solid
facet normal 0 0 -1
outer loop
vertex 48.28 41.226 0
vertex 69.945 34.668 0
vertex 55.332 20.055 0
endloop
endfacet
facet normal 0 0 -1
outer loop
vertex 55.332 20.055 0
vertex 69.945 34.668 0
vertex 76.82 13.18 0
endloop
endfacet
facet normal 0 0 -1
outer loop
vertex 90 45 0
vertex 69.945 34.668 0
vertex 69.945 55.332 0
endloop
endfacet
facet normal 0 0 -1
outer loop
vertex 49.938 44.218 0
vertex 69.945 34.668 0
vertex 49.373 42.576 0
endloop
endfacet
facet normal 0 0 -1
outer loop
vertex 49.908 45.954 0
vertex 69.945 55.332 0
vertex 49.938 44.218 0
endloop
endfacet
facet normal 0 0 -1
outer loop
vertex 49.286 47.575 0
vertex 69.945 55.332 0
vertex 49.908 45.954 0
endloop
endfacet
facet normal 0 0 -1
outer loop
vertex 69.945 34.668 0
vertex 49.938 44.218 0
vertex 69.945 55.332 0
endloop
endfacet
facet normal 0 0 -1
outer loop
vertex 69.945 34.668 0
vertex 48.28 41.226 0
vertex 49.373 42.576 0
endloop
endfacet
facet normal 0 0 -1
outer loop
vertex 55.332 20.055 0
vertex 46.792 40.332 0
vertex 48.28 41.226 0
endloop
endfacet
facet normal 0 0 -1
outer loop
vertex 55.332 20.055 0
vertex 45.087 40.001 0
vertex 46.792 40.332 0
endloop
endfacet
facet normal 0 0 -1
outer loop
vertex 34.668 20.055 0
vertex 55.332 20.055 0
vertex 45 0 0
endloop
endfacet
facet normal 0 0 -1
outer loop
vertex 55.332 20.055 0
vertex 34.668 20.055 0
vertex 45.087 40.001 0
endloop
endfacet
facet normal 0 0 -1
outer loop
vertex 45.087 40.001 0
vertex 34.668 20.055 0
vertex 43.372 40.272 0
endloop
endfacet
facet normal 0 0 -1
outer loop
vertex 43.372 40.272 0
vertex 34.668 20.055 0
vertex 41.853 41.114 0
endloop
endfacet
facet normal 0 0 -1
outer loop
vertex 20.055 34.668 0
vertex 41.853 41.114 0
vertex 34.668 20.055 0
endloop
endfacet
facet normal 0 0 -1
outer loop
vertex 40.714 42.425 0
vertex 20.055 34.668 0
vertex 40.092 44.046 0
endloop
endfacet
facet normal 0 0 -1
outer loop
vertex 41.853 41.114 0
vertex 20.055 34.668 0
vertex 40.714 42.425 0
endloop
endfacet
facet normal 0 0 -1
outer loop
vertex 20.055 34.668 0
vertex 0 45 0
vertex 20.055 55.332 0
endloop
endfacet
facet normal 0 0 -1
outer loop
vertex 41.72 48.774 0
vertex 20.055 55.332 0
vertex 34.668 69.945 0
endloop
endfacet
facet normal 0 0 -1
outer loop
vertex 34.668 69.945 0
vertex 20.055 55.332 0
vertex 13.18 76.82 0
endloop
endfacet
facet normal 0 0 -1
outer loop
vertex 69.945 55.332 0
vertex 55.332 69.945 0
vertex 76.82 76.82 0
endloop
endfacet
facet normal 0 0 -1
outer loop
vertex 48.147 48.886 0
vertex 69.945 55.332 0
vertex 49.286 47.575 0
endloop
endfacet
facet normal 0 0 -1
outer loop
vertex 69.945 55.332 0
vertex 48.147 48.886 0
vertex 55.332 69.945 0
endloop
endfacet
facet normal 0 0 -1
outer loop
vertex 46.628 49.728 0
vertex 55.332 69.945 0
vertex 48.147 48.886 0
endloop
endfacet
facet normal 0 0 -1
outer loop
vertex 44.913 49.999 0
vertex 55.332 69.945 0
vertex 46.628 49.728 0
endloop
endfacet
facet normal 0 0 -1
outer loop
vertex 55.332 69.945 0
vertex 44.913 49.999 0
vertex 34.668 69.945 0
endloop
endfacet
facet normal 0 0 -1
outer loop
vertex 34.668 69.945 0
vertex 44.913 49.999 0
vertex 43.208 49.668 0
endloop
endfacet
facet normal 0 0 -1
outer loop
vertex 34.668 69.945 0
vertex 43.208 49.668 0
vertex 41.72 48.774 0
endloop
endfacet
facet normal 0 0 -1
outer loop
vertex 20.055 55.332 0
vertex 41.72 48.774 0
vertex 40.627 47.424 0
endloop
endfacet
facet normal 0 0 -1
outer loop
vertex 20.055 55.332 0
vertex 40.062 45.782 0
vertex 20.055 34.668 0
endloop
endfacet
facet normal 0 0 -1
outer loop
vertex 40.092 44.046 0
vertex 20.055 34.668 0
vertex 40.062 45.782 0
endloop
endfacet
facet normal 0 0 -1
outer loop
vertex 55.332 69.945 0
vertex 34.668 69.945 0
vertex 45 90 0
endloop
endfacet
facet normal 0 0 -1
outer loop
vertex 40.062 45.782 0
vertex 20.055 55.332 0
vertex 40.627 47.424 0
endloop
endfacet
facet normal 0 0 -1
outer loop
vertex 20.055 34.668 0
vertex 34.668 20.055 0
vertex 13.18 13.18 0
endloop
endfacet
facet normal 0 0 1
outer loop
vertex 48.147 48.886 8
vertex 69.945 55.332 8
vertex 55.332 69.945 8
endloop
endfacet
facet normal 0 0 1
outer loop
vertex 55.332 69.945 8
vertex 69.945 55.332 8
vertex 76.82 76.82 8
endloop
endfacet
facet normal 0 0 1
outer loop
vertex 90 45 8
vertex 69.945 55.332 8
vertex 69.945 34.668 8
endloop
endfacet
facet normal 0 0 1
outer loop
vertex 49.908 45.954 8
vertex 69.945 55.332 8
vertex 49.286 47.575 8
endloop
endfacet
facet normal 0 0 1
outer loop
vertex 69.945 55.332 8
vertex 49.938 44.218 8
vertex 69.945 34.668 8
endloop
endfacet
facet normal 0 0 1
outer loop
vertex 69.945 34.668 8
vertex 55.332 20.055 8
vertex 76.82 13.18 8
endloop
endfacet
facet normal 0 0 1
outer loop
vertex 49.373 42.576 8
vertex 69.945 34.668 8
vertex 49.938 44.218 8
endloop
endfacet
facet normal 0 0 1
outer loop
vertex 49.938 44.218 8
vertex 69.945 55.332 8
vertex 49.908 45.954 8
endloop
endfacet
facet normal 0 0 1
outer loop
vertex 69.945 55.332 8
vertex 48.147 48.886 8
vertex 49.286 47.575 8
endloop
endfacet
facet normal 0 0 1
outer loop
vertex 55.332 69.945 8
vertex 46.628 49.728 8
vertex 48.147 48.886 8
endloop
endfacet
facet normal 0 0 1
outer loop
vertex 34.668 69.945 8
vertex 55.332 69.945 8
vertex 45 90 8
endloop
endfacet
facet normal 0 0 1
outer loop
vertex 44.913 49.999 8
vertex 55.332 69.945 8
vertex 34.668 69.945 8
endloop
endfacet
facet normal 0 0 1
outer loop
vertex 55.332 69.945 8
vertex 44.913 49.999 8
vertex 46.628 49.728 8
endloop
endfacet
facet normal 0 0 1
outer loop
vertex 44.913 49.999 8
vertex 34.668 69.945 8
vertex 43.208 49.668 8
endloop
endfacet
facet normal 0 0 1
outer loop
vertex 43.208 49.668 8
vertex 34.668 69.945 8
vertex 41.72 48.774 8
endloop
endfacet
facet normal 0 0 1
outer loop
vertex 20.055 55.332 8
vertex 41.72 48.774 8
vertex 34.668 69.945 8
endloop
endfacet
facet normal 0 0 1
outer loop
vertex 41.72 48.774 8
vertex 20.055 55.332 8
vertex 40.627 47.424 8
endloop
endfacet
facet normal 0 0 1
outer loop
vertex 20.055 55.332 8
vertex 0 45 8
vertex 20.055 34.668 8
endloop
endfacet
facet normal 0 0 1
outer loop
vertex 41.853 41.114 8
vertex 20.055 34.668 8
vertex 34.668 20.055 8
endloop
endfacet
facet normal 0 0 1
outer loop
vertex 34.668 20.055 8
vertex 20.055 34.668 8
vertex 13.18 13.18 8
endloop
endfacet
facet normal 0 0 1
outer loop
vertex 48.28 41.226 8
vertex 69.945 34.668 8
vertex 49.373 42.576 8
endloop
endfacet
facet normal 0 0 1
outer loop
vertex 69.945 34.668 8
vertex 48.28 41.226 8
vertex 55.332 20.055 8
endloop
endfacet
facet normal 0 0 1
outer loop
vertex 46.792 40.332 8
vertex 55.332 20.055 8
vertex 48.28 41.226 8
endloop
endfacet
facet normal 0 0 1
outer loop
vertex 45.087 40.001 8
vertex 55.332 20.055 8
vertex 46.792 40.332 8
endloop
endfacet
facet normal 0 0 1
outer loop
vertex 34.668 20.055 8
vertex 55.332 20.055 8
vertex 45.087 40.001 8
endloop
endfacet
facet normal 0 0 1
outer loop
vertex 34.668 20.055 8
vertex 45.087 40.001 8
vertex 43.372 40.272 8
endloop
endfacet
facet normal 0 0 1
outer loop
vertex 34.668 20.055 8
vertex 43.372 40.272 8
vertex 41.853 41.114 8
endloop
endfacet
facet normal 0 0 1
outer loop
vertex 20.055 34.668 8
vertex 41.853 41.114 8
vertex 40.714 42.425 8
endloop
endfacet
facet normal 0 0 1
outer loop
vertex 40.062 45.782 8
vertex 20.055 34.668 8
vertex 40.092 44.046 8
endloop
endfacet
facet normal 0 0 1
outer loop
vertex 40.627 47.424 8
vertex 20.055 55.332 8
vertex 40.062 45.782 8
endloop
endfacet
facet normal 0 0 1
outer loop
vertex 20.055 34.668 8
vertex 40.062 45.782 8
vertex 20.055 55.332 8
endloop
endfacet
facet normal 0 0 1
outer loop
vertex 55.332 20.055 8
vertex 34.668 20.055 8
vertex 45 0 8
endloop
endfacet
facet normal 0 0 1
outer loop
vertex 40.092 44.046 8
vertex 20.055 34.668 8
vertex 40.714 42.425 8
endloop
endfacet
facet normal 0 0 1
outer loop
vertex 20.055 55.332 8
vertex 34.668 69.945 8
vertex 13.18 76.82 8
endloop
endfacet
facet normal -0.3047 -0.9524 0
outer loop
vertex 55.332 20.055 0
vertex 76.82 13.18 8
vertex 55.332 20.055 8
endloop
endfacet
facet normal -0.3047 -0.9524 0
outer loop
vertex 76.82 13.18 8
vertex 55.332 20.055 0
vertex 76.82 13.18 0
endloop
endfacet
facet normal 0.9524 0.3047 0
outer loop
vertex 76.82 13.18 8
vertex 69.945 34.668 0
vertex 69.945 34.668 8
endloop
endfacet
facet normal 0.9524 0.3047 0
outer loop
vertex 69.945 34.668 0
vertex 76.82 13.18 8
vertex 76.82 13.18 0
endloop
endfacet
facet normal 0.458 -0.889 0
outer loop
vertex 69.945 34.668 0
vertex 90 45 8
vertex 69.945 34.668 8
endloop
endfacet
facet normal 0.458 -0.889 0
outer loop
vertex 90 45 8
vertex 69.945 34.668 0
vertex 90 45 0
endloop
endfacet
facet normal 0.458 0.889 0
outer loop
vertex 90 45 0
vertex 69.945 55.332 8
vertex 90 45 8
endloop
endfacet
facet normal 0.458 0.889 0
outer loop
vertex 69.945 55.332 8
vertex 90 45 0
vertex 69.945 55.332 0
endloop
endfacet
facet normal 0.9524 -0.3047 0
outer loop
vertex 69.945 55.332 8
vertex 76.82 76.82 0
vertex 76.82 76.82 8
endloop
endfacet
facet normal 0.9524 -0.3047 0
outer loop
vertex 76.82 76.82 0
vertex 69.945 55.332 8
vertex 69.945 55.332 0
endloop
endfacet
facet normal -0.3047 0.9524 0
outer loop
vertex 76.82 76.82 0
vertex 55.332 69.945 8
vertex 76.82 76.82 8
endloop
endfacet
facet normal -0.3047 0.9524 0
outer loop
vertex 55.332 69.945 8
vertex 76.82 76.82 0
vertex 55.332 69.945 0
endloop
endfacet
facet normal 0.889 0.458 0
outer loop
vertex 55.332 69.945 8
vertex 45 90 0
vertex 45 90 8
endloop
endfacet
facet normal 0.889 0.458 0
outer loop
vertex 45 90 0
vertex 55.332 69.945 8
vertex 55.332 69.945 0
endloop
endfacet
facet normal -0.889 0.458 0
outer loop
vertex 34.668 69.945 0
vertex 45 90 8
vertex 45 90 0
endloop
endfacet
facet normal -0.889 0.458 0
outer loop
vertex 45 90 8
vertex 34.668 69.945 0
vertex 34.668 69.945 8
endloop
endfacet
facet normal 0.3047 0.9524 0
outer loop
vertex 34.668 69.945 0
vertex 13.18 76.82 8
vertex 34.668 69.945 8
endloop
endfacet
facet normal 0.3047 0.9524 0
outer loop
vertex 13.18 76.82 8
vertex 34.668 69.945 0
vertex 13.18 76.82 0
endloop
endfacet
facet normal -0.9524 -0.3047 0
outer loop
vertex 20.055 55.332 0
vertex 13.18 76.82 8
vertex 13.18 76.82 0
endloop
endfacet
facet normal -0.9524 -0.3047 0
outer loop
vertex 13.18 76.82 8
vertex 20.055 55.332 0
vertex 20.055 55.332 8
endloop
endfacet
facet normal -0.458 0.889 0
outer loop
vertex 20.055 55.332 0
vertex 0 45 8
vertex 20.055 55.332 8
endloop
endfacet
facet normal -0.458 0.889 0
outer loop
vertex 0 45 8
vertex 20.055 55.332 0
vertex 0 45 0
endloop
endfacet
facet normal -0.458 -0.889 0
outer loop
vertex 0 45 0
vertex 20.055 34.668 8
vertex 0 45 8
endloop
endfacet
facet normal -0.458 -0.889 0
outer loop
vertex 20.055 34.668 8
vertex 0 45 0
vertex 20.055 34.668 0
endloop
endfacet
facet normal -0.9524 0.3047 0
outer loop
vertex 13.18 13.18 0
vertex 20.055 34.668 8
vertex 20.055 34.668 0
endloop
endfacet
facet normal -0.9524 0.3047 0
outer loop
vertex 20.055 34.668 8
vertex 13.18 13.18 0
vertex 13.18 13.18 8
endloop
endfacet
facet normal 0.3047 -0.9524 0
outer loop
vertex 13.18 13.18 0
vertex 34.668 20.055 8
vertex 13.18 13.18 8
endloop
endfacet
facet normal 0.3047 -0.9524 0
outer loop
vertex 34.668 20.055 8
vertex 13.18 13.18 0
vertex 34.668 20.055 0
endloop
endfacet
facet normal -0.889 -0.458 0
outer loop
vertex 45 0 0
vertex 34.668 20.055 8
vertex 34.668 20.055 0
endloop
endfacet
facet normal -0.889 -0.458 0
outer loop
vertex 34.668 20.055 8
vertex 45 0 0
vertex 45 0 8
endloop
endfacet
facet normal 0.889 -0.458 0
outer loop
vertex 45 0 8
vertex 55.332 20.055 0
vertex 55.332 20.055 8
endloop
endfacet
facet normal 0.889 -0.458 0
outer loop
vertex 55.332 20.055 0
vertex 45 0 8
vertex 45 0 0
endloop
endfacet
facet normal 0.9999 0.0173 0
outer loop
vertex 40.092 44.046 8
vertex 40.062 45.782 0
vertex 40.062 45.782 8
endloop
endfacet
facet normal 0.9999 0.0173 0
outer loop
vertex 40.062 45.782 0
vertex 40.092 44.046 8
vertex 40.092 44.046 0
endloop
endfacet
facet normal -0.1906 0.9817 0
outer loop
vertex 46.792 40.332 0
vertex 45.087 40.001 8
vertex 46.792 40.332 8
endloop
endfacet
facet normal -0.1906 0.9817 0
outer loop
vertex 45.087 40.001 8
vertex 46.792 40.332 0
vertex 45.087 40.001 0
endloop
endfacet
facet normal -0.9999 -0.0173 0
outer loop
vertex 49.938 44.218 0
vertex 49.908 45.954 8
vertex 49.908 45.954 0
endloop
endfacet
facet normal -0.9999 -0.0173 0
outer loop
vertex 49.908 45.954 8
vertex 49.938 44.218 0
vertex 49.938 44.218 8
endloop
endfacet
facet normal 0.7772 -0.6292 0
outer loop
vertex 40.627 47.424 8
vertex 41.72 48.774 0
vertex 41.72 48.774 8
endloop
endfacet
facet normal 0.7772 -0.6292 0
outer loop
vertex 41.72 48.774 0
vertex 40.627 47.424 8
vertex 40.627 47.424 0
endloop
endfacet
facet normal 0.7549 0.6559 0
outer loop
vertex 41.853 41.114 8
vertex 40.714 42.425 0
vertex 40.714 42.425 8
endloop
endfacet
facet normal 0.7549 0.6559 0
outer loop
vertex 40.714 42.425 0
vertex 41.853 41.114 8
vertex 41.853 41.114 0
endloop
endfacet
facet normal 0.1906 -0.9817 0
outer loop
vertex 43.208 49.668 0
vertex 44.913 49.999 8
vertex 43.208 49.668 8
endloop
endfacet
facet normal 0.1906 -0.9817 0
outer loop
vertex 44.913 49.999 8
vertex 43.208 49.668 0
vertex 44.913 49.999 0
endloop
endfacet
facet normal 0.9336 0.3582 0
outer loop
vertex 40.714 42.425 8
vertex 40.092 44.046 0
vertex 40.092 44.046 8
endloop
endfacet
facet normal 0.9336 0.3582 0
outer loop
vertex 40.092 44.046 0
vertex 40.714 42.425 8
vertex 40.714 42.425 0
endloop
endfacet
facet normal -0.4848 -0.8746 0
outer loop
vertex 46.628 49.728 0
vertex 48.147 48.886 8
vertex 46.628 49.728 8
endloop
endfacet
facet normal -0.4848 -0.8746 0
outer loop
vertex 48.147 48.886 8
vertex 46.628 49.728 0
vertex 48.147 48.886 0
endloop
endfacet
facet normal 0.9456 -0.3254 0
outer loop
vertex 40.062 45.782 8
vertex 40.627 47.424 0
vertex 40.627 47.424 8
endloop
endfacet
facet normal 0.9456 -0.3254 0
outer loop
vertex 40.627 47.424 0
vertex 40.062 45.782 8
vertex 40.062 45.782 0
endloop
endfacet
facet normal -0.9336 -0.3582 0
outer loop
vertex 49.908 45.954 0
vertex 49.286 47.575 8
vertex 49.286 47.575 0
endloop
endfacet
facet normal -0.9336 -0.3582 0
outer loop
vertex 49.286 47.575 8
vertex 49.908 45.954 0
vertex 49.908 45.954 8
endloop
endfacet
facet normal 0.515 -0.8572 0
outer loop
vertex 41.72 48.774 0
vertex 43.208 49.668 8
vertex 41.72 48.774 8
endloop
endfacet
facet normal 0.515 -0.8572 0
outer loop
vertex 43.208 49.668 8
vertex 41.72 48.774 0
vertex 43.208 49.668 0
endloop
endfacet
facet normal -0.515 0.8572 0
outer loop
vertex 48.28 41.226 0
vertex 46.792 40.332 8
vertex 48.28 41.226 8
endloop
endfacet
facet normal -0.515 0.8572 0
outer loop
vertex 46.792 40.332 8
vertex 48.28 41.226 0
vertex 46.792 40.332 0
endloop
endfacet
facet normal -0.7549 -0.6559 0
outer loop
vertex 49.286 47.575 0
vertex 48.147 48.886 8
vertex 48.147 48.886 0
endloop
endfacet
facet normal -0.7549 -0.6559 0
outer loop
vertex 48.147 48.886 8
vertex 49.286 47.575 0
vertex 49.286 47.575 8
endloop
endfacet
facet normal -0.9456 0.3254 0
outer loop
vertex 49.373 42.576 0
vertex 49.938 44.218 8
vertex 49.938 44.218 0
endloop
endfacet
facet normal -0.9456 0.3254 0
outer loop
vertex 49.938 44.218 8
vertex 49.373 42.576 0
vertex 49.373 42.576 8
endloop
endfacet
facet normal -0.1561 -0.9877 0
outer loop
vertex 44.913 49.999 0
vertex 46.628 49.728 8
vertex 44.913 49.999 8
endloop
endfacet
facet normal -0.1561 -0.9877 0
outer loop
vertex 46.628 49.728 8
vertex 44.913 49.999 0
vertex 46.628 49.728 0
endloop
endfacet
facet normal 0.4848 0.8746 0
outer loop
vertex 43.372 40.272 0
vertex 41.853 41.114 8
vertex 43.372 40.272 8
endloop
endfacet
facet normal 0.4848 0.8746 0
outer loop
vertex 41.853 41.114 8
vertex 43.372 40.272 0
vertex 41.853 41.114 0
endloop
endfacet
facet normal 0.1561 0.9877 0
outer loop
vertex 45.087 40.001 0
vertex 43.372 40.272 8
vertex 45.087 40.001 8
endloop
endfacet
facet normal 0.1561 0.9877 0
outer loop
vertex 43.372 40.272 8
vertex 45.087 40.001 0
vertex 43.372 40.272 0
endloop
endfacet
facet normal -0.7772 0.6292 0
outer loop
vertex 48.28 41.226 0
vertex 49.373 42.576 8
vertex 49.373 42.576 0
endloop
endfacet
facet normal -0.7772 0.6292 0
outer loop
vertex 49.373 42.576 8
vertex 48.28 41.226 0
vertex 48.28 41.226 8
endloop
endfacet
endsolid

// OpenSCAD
$fn = 32;

// ----------------------------------------------------------------------
// Star wheel: 8-point blunt, R45
// ----------------------------------------------------------------------

// --- parameters (mm) ---
n_points = 8;             // number of points / teeth
r_out = 45;               // tip radius
r_in = 27;                // root radius
bore_r = 5;               // centre bore radius
plate_t = 8;              // plate thickness, Z (extrusion height)
bore_d = 10;              // centre bore diameter

profile = [[0, 45], [20.055, 34.668], [13.18, 13.18], [34.668, 20.055], [45, 0], [55.332, 20.055], [76.82, 13.18], [69.945, 34.668], [90, 45], [69.945, 55.332], [76.82, 76.82], [55.332, 69.945], [45, 90], [34.668, 69.945], [13.18, 76.82], [20.055, 55.332]];  // primary outline, 16 points, counter clockwise
void_1 = [[49.908, 45.954], [49.286, 47.575], [48.147, 48.886], [46.628, 49.728], [44.913, 49.999], [43.208, 49.668], [41.72, 48.774], [40.627, 47.424], [40.062, 45.782], [40.092, 44.046], [40.714, 42.425], [41.853, 41.114], [43.372, 40.272], [45.087, 40.001], [46.792, 40.332], [48.28, 41.226], [49.373, 42.576], [49.938, 44.218]];  // centre bore, 18 points

// --- the one profile operation ---
difference() {
  linear_extrude(height = plate_t) polygon(points = profile);
  translate([0, 0, -1])
    linear_extrude(height = plate_t + 2) polygon(points = void_1);
}
